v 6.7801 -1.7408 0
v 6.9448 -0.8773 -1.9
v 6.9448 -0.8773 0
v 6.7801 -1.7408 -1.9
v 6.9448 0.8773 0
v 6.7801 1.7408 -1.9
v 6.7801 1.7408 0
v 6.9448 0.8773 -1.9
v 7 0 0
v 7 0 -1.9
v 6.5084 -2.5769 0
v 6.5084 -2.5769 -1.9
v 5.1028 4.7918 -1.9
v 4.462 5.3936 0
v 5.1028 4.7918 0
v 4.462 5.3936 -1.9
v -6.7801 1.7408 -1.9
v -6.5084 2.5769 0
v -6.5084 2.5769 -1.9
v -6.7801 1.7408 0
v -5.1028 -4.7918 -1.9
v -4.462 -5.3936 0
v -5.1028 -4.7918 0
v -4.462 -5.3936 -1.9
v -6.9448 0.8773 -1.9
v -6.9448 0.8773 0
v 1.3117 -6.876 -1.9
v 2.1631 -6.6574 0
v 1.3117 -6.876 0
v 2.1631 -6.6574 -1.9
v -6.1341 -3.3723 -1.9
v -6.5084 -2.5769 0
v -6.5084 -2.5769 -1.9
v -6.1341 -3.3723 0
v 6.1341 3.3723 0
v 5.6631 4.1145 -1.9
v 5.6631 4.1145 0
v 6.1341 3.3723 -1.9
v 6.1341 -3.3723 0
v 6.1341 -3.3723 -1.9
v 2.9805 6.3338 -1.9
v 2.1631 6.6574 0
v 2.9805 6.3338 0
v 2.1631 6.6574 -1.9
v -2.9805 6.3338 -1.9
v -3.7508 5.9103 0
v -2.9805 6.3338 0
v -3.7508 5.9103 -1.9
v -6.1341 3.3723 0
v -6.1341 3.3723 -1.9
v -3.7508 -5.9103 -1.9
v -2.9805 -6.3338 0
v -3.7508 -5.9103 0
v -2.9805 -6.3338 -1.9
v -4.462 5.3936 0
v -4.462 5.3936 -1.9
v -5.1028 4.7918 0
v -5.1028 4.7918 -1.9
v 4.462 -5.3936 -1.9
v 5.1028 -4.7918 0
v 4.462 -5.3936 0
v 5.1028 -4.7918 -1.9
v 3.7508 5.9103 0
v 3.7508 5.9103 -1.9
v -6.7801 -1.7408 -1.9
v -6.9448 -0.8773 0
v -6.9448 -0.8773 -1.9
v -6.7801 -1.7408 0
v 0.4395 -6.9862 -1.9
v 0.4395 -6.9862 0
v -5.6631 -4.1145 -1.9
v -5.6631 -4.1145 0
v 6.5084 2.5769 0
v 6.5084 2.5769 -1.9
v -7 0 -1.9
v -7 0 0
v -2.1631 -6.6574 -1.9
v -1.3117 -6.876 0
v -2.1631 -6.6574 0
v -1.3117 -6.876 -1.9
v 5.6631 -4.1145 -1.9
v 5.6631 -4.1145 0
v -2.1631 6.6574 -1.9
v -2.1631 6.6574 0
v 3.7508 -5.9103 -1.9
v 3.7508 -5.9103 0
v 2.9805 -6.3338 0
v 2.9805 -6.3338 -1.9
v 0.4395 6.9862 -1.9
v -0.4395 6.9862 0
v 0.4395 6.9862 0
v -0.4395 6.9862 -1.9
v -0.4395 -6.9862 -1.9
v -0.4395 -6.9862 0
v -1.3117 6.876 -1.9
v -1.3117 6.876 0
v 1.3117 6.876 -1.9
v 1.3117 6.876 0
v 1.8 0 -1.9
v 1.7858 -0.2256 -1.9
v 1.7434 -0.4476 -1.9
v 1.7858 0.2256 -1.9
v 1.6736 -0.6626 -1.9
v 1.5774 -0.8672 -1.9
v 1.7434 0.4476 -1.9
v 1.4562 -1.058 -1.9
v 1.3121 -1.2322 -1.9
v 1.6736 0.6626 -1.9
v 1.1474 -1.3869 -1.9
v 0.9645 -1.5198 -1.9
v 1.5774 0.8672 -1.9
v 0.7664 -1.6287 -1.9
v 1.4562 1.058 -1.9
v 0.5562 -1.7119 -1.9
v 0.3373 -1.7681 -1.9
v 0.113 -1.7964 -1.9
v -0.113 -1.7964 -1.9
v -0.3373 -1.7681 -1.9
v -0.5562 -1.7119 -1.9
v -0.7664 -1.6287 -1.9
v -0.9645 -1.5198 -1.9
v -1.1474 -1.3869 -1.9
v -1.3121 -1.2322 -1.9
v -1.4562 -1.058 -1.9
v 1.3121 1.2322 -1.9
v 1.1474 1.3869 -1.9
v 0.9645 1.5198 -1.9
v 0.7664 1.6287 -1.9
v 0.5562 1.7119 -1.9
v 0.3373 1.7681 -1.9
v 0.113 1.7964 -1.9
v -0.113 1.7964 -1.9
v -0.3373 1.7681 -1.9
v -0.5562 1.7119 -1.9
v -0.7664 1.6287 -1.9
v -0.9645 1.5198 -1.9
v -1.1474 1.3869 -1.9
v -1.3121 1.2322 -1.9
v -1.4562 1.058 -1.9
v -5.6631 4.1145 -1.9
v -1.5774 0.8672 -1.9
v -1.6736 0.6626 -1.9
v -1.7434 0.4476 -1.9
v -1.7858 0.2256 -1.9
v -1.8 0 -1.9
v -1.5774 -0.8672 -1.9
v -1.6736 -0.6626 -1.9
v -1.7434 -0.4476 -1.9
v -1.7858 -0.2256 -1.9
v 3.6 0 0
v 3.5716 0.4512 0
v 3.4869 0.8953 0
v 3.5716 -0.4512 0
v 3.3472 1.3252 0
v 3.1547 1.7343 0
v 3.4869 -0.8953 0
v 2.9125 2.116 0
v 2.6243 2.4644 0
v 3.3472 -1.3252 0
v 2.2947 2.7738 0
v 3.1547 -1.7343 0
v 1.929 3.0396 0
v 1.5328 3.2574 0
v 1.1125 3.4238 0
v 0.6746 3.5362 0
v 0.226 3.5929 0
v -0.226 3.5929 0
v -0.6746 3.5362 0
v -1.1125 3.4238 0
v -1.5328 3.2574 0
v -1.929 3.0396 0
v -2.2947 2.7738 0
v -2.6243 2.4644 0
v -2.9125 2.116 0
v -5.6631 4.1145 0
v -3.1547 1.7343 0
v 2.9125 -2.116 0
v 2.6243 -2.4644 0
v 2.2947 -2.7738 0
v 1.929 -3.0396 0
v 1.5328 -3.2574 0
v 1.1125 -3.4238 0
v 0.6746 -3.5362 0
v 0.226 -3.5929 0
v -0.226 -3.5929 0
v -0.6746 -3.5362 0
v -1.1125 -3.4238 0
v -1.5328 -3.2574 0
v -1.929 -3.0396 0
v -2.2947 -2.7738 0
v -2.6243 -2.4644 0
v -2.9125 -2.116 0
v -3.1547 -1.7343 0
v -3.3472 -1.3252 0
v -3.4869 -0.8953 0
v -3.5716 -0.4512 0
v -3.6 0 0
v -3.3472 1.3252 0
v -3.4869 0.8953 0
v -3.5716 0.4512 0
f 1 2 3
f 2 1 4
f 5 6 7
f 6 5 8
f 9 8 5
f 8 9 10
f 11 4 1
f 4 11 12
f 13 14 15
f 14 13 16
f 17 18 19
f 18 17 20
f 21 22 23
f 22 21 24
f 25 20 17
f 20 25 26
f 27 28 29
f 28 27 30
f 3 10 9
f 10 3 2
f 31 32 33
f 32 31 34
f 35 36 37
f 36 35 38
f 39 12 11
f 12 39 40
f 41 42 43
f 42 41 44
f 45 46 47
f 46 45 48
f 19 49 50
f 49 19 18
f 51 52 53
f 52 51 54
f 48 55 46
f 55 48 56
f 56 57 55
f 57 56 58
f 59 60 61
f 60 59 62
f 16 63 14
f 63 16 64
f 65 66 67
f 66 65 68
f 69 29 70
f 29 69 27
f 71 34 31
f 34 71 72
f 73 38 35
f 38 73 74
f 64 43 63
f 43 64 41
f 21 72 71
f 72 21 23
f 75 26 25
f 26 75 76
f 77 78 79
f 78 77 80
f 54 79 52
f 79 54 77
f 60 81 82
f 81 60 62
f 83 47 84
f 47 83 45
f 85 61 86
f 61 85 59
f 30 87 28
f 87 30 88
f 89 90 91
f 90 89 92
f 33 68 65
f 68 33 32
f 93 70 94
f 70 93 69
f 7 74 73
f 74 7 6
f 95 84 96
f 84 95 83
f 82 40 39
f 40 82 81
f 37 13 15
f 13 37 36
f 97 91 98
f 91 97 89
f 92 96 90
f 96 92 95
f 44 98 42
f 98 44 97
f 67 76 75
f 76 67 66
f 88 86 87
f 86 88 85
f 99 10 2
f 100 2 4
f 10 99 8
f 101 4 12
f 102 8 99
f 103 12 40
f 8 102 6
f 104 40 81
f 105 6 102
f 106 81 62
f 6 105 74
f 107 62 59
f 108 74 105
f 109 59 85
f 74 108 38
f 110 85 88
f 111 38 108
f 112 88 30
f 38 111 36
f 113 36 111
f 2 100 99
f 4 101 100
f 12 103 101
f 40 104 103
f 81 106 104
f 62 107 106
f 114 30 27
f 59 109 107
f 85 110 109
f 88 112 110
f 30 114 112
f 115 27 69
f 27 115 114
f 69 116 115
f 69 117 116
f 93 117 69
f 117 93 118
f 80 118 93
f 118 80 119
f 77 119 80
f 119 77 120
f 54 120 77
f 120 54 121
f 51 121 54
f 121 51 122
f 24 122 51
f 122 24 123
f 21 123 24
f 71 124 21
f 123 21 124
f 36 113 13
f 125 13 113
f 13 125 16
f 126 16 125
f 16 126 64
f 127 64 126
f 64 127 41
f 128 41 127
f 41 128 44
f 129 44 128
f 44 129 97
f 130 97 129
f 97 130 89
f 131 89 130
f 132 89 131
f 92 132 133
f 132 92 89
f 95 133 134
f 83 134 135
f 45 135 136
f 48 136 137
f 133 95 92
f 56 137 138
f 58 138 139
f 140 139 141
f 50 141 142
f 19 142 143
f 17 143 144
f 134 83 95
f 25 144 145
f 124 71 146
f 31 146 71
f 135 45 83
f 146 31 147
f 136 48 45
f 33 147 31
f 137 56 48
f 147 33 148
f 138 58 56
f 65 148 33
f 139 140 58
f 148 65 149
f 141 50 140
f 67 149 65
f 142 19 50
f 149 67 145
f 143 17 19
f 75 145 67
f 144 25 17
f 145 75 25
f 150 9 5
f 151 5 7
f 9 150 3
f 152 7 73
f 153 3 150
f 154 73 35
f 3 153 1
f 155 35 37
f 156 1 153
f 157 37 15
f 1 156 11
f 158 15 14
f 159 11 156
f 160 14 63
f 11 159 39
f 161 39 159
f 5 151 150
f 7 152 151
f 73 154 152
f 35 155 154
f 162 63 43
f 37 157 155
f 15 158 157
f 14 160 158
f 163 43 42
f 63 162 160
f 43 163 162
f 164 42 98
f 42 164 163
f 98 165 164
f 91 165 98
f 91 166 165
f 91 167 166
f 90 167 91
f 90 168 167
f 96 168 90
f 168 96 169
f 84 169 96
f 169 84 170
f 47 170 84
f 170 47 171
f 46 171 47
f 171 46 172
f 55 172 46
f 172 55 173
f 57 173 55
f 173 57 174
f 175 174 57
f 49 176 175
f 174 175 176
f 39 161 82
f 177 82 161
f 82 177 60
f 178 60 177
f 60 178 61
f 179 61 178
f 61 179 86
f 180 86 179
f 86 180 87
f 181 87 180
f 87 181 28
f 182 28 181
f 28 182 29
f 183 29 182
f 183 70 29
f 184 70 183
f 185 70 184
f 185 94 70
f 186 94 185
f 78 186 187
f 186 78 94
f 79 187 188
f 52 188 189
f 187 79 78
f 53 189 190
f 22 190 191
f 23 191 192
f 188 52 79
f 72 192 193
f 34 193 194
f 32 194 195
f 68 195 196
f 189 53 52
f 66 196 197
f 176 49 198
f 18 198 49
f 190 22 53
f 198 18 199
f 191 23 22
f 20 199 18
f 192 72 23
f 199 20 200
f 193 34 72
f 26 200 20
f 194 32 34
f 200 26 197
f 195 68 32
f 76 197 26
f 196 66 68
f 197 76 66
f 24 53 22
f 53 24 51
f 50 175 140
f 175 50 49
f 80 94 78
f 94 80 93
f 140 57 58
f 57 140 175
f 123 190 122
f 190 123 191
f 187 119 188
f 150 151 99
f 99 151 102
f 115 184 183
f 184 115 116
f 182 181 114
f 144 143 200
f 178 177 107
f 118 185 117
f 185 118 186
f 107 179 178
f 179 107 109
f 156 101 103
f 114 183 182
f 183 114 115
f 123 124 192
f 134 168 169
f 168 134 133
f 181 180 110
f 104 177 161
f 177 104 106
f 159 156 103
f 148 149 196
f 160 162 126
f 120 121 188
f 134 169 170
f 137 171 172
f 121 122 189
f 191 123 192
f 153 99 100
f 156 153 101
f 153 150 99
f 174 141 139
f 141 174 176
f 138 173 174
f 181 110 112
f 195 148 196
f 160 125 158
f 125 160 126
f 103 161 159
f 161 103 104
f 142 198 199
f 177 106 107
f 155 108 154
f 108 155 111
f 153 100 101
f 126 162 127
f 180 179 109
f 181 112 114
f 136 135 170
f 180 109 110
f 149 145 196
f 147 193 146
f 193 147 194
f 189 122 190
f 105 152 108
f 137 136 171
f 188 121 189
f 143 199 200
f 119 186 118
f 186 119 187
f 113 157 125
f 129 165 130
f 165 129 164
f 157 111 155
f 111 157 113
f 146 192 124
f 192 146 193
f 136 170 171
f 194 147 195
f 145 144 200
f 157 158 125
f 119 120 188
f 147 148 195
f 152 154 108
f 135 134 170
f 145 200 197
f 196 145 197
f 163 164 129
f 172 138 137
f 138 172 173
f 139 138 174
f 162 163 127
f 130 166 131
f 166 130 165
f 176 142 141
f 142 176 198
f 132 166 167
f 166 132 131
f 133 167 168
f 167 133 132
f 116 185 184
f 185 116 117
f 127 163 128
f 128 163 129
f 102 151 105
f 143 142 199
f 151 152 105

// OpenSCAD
$fn = 50;


difference() {
	union() {
		translate(v = [0, 0, -1.9000000000]) {
			cylinder(h = 1.9000000000, r = 7.0000000000);
		}
		translate(v = [0, 0, -1.9000000000]) {
			cylinder(h = 1.9000000000, r = 2.8750000000);
		}
	}
	union() {
		translate(v = [0, 0, 0]) {
			rotate(a = [0, 0, 0]) {
				difference() {
					union() {
						translate(v = [0, 0, -1.9000000000]) {
							cylinder(h = 1.9000000000, r = 1.5000000000);
						}
						translate(v = [0, 0, -1.9000000000]) {
							cylinder(h = 1.9000000000, r1 = 1.8000000000, r2 = 3.6000000000);
						}
						translate(v = [0, 0, -1.9000000000]) {
							cylinder(h = 1.9000000000, r = 1.8000000000);
						}
						translate(v = [0, 0, -1.9000000000]) {
							cylinder(h = 1.9000000000, r = 1.5000000000);
						}
					}
					union();
				}
			}
		}
	}
}
